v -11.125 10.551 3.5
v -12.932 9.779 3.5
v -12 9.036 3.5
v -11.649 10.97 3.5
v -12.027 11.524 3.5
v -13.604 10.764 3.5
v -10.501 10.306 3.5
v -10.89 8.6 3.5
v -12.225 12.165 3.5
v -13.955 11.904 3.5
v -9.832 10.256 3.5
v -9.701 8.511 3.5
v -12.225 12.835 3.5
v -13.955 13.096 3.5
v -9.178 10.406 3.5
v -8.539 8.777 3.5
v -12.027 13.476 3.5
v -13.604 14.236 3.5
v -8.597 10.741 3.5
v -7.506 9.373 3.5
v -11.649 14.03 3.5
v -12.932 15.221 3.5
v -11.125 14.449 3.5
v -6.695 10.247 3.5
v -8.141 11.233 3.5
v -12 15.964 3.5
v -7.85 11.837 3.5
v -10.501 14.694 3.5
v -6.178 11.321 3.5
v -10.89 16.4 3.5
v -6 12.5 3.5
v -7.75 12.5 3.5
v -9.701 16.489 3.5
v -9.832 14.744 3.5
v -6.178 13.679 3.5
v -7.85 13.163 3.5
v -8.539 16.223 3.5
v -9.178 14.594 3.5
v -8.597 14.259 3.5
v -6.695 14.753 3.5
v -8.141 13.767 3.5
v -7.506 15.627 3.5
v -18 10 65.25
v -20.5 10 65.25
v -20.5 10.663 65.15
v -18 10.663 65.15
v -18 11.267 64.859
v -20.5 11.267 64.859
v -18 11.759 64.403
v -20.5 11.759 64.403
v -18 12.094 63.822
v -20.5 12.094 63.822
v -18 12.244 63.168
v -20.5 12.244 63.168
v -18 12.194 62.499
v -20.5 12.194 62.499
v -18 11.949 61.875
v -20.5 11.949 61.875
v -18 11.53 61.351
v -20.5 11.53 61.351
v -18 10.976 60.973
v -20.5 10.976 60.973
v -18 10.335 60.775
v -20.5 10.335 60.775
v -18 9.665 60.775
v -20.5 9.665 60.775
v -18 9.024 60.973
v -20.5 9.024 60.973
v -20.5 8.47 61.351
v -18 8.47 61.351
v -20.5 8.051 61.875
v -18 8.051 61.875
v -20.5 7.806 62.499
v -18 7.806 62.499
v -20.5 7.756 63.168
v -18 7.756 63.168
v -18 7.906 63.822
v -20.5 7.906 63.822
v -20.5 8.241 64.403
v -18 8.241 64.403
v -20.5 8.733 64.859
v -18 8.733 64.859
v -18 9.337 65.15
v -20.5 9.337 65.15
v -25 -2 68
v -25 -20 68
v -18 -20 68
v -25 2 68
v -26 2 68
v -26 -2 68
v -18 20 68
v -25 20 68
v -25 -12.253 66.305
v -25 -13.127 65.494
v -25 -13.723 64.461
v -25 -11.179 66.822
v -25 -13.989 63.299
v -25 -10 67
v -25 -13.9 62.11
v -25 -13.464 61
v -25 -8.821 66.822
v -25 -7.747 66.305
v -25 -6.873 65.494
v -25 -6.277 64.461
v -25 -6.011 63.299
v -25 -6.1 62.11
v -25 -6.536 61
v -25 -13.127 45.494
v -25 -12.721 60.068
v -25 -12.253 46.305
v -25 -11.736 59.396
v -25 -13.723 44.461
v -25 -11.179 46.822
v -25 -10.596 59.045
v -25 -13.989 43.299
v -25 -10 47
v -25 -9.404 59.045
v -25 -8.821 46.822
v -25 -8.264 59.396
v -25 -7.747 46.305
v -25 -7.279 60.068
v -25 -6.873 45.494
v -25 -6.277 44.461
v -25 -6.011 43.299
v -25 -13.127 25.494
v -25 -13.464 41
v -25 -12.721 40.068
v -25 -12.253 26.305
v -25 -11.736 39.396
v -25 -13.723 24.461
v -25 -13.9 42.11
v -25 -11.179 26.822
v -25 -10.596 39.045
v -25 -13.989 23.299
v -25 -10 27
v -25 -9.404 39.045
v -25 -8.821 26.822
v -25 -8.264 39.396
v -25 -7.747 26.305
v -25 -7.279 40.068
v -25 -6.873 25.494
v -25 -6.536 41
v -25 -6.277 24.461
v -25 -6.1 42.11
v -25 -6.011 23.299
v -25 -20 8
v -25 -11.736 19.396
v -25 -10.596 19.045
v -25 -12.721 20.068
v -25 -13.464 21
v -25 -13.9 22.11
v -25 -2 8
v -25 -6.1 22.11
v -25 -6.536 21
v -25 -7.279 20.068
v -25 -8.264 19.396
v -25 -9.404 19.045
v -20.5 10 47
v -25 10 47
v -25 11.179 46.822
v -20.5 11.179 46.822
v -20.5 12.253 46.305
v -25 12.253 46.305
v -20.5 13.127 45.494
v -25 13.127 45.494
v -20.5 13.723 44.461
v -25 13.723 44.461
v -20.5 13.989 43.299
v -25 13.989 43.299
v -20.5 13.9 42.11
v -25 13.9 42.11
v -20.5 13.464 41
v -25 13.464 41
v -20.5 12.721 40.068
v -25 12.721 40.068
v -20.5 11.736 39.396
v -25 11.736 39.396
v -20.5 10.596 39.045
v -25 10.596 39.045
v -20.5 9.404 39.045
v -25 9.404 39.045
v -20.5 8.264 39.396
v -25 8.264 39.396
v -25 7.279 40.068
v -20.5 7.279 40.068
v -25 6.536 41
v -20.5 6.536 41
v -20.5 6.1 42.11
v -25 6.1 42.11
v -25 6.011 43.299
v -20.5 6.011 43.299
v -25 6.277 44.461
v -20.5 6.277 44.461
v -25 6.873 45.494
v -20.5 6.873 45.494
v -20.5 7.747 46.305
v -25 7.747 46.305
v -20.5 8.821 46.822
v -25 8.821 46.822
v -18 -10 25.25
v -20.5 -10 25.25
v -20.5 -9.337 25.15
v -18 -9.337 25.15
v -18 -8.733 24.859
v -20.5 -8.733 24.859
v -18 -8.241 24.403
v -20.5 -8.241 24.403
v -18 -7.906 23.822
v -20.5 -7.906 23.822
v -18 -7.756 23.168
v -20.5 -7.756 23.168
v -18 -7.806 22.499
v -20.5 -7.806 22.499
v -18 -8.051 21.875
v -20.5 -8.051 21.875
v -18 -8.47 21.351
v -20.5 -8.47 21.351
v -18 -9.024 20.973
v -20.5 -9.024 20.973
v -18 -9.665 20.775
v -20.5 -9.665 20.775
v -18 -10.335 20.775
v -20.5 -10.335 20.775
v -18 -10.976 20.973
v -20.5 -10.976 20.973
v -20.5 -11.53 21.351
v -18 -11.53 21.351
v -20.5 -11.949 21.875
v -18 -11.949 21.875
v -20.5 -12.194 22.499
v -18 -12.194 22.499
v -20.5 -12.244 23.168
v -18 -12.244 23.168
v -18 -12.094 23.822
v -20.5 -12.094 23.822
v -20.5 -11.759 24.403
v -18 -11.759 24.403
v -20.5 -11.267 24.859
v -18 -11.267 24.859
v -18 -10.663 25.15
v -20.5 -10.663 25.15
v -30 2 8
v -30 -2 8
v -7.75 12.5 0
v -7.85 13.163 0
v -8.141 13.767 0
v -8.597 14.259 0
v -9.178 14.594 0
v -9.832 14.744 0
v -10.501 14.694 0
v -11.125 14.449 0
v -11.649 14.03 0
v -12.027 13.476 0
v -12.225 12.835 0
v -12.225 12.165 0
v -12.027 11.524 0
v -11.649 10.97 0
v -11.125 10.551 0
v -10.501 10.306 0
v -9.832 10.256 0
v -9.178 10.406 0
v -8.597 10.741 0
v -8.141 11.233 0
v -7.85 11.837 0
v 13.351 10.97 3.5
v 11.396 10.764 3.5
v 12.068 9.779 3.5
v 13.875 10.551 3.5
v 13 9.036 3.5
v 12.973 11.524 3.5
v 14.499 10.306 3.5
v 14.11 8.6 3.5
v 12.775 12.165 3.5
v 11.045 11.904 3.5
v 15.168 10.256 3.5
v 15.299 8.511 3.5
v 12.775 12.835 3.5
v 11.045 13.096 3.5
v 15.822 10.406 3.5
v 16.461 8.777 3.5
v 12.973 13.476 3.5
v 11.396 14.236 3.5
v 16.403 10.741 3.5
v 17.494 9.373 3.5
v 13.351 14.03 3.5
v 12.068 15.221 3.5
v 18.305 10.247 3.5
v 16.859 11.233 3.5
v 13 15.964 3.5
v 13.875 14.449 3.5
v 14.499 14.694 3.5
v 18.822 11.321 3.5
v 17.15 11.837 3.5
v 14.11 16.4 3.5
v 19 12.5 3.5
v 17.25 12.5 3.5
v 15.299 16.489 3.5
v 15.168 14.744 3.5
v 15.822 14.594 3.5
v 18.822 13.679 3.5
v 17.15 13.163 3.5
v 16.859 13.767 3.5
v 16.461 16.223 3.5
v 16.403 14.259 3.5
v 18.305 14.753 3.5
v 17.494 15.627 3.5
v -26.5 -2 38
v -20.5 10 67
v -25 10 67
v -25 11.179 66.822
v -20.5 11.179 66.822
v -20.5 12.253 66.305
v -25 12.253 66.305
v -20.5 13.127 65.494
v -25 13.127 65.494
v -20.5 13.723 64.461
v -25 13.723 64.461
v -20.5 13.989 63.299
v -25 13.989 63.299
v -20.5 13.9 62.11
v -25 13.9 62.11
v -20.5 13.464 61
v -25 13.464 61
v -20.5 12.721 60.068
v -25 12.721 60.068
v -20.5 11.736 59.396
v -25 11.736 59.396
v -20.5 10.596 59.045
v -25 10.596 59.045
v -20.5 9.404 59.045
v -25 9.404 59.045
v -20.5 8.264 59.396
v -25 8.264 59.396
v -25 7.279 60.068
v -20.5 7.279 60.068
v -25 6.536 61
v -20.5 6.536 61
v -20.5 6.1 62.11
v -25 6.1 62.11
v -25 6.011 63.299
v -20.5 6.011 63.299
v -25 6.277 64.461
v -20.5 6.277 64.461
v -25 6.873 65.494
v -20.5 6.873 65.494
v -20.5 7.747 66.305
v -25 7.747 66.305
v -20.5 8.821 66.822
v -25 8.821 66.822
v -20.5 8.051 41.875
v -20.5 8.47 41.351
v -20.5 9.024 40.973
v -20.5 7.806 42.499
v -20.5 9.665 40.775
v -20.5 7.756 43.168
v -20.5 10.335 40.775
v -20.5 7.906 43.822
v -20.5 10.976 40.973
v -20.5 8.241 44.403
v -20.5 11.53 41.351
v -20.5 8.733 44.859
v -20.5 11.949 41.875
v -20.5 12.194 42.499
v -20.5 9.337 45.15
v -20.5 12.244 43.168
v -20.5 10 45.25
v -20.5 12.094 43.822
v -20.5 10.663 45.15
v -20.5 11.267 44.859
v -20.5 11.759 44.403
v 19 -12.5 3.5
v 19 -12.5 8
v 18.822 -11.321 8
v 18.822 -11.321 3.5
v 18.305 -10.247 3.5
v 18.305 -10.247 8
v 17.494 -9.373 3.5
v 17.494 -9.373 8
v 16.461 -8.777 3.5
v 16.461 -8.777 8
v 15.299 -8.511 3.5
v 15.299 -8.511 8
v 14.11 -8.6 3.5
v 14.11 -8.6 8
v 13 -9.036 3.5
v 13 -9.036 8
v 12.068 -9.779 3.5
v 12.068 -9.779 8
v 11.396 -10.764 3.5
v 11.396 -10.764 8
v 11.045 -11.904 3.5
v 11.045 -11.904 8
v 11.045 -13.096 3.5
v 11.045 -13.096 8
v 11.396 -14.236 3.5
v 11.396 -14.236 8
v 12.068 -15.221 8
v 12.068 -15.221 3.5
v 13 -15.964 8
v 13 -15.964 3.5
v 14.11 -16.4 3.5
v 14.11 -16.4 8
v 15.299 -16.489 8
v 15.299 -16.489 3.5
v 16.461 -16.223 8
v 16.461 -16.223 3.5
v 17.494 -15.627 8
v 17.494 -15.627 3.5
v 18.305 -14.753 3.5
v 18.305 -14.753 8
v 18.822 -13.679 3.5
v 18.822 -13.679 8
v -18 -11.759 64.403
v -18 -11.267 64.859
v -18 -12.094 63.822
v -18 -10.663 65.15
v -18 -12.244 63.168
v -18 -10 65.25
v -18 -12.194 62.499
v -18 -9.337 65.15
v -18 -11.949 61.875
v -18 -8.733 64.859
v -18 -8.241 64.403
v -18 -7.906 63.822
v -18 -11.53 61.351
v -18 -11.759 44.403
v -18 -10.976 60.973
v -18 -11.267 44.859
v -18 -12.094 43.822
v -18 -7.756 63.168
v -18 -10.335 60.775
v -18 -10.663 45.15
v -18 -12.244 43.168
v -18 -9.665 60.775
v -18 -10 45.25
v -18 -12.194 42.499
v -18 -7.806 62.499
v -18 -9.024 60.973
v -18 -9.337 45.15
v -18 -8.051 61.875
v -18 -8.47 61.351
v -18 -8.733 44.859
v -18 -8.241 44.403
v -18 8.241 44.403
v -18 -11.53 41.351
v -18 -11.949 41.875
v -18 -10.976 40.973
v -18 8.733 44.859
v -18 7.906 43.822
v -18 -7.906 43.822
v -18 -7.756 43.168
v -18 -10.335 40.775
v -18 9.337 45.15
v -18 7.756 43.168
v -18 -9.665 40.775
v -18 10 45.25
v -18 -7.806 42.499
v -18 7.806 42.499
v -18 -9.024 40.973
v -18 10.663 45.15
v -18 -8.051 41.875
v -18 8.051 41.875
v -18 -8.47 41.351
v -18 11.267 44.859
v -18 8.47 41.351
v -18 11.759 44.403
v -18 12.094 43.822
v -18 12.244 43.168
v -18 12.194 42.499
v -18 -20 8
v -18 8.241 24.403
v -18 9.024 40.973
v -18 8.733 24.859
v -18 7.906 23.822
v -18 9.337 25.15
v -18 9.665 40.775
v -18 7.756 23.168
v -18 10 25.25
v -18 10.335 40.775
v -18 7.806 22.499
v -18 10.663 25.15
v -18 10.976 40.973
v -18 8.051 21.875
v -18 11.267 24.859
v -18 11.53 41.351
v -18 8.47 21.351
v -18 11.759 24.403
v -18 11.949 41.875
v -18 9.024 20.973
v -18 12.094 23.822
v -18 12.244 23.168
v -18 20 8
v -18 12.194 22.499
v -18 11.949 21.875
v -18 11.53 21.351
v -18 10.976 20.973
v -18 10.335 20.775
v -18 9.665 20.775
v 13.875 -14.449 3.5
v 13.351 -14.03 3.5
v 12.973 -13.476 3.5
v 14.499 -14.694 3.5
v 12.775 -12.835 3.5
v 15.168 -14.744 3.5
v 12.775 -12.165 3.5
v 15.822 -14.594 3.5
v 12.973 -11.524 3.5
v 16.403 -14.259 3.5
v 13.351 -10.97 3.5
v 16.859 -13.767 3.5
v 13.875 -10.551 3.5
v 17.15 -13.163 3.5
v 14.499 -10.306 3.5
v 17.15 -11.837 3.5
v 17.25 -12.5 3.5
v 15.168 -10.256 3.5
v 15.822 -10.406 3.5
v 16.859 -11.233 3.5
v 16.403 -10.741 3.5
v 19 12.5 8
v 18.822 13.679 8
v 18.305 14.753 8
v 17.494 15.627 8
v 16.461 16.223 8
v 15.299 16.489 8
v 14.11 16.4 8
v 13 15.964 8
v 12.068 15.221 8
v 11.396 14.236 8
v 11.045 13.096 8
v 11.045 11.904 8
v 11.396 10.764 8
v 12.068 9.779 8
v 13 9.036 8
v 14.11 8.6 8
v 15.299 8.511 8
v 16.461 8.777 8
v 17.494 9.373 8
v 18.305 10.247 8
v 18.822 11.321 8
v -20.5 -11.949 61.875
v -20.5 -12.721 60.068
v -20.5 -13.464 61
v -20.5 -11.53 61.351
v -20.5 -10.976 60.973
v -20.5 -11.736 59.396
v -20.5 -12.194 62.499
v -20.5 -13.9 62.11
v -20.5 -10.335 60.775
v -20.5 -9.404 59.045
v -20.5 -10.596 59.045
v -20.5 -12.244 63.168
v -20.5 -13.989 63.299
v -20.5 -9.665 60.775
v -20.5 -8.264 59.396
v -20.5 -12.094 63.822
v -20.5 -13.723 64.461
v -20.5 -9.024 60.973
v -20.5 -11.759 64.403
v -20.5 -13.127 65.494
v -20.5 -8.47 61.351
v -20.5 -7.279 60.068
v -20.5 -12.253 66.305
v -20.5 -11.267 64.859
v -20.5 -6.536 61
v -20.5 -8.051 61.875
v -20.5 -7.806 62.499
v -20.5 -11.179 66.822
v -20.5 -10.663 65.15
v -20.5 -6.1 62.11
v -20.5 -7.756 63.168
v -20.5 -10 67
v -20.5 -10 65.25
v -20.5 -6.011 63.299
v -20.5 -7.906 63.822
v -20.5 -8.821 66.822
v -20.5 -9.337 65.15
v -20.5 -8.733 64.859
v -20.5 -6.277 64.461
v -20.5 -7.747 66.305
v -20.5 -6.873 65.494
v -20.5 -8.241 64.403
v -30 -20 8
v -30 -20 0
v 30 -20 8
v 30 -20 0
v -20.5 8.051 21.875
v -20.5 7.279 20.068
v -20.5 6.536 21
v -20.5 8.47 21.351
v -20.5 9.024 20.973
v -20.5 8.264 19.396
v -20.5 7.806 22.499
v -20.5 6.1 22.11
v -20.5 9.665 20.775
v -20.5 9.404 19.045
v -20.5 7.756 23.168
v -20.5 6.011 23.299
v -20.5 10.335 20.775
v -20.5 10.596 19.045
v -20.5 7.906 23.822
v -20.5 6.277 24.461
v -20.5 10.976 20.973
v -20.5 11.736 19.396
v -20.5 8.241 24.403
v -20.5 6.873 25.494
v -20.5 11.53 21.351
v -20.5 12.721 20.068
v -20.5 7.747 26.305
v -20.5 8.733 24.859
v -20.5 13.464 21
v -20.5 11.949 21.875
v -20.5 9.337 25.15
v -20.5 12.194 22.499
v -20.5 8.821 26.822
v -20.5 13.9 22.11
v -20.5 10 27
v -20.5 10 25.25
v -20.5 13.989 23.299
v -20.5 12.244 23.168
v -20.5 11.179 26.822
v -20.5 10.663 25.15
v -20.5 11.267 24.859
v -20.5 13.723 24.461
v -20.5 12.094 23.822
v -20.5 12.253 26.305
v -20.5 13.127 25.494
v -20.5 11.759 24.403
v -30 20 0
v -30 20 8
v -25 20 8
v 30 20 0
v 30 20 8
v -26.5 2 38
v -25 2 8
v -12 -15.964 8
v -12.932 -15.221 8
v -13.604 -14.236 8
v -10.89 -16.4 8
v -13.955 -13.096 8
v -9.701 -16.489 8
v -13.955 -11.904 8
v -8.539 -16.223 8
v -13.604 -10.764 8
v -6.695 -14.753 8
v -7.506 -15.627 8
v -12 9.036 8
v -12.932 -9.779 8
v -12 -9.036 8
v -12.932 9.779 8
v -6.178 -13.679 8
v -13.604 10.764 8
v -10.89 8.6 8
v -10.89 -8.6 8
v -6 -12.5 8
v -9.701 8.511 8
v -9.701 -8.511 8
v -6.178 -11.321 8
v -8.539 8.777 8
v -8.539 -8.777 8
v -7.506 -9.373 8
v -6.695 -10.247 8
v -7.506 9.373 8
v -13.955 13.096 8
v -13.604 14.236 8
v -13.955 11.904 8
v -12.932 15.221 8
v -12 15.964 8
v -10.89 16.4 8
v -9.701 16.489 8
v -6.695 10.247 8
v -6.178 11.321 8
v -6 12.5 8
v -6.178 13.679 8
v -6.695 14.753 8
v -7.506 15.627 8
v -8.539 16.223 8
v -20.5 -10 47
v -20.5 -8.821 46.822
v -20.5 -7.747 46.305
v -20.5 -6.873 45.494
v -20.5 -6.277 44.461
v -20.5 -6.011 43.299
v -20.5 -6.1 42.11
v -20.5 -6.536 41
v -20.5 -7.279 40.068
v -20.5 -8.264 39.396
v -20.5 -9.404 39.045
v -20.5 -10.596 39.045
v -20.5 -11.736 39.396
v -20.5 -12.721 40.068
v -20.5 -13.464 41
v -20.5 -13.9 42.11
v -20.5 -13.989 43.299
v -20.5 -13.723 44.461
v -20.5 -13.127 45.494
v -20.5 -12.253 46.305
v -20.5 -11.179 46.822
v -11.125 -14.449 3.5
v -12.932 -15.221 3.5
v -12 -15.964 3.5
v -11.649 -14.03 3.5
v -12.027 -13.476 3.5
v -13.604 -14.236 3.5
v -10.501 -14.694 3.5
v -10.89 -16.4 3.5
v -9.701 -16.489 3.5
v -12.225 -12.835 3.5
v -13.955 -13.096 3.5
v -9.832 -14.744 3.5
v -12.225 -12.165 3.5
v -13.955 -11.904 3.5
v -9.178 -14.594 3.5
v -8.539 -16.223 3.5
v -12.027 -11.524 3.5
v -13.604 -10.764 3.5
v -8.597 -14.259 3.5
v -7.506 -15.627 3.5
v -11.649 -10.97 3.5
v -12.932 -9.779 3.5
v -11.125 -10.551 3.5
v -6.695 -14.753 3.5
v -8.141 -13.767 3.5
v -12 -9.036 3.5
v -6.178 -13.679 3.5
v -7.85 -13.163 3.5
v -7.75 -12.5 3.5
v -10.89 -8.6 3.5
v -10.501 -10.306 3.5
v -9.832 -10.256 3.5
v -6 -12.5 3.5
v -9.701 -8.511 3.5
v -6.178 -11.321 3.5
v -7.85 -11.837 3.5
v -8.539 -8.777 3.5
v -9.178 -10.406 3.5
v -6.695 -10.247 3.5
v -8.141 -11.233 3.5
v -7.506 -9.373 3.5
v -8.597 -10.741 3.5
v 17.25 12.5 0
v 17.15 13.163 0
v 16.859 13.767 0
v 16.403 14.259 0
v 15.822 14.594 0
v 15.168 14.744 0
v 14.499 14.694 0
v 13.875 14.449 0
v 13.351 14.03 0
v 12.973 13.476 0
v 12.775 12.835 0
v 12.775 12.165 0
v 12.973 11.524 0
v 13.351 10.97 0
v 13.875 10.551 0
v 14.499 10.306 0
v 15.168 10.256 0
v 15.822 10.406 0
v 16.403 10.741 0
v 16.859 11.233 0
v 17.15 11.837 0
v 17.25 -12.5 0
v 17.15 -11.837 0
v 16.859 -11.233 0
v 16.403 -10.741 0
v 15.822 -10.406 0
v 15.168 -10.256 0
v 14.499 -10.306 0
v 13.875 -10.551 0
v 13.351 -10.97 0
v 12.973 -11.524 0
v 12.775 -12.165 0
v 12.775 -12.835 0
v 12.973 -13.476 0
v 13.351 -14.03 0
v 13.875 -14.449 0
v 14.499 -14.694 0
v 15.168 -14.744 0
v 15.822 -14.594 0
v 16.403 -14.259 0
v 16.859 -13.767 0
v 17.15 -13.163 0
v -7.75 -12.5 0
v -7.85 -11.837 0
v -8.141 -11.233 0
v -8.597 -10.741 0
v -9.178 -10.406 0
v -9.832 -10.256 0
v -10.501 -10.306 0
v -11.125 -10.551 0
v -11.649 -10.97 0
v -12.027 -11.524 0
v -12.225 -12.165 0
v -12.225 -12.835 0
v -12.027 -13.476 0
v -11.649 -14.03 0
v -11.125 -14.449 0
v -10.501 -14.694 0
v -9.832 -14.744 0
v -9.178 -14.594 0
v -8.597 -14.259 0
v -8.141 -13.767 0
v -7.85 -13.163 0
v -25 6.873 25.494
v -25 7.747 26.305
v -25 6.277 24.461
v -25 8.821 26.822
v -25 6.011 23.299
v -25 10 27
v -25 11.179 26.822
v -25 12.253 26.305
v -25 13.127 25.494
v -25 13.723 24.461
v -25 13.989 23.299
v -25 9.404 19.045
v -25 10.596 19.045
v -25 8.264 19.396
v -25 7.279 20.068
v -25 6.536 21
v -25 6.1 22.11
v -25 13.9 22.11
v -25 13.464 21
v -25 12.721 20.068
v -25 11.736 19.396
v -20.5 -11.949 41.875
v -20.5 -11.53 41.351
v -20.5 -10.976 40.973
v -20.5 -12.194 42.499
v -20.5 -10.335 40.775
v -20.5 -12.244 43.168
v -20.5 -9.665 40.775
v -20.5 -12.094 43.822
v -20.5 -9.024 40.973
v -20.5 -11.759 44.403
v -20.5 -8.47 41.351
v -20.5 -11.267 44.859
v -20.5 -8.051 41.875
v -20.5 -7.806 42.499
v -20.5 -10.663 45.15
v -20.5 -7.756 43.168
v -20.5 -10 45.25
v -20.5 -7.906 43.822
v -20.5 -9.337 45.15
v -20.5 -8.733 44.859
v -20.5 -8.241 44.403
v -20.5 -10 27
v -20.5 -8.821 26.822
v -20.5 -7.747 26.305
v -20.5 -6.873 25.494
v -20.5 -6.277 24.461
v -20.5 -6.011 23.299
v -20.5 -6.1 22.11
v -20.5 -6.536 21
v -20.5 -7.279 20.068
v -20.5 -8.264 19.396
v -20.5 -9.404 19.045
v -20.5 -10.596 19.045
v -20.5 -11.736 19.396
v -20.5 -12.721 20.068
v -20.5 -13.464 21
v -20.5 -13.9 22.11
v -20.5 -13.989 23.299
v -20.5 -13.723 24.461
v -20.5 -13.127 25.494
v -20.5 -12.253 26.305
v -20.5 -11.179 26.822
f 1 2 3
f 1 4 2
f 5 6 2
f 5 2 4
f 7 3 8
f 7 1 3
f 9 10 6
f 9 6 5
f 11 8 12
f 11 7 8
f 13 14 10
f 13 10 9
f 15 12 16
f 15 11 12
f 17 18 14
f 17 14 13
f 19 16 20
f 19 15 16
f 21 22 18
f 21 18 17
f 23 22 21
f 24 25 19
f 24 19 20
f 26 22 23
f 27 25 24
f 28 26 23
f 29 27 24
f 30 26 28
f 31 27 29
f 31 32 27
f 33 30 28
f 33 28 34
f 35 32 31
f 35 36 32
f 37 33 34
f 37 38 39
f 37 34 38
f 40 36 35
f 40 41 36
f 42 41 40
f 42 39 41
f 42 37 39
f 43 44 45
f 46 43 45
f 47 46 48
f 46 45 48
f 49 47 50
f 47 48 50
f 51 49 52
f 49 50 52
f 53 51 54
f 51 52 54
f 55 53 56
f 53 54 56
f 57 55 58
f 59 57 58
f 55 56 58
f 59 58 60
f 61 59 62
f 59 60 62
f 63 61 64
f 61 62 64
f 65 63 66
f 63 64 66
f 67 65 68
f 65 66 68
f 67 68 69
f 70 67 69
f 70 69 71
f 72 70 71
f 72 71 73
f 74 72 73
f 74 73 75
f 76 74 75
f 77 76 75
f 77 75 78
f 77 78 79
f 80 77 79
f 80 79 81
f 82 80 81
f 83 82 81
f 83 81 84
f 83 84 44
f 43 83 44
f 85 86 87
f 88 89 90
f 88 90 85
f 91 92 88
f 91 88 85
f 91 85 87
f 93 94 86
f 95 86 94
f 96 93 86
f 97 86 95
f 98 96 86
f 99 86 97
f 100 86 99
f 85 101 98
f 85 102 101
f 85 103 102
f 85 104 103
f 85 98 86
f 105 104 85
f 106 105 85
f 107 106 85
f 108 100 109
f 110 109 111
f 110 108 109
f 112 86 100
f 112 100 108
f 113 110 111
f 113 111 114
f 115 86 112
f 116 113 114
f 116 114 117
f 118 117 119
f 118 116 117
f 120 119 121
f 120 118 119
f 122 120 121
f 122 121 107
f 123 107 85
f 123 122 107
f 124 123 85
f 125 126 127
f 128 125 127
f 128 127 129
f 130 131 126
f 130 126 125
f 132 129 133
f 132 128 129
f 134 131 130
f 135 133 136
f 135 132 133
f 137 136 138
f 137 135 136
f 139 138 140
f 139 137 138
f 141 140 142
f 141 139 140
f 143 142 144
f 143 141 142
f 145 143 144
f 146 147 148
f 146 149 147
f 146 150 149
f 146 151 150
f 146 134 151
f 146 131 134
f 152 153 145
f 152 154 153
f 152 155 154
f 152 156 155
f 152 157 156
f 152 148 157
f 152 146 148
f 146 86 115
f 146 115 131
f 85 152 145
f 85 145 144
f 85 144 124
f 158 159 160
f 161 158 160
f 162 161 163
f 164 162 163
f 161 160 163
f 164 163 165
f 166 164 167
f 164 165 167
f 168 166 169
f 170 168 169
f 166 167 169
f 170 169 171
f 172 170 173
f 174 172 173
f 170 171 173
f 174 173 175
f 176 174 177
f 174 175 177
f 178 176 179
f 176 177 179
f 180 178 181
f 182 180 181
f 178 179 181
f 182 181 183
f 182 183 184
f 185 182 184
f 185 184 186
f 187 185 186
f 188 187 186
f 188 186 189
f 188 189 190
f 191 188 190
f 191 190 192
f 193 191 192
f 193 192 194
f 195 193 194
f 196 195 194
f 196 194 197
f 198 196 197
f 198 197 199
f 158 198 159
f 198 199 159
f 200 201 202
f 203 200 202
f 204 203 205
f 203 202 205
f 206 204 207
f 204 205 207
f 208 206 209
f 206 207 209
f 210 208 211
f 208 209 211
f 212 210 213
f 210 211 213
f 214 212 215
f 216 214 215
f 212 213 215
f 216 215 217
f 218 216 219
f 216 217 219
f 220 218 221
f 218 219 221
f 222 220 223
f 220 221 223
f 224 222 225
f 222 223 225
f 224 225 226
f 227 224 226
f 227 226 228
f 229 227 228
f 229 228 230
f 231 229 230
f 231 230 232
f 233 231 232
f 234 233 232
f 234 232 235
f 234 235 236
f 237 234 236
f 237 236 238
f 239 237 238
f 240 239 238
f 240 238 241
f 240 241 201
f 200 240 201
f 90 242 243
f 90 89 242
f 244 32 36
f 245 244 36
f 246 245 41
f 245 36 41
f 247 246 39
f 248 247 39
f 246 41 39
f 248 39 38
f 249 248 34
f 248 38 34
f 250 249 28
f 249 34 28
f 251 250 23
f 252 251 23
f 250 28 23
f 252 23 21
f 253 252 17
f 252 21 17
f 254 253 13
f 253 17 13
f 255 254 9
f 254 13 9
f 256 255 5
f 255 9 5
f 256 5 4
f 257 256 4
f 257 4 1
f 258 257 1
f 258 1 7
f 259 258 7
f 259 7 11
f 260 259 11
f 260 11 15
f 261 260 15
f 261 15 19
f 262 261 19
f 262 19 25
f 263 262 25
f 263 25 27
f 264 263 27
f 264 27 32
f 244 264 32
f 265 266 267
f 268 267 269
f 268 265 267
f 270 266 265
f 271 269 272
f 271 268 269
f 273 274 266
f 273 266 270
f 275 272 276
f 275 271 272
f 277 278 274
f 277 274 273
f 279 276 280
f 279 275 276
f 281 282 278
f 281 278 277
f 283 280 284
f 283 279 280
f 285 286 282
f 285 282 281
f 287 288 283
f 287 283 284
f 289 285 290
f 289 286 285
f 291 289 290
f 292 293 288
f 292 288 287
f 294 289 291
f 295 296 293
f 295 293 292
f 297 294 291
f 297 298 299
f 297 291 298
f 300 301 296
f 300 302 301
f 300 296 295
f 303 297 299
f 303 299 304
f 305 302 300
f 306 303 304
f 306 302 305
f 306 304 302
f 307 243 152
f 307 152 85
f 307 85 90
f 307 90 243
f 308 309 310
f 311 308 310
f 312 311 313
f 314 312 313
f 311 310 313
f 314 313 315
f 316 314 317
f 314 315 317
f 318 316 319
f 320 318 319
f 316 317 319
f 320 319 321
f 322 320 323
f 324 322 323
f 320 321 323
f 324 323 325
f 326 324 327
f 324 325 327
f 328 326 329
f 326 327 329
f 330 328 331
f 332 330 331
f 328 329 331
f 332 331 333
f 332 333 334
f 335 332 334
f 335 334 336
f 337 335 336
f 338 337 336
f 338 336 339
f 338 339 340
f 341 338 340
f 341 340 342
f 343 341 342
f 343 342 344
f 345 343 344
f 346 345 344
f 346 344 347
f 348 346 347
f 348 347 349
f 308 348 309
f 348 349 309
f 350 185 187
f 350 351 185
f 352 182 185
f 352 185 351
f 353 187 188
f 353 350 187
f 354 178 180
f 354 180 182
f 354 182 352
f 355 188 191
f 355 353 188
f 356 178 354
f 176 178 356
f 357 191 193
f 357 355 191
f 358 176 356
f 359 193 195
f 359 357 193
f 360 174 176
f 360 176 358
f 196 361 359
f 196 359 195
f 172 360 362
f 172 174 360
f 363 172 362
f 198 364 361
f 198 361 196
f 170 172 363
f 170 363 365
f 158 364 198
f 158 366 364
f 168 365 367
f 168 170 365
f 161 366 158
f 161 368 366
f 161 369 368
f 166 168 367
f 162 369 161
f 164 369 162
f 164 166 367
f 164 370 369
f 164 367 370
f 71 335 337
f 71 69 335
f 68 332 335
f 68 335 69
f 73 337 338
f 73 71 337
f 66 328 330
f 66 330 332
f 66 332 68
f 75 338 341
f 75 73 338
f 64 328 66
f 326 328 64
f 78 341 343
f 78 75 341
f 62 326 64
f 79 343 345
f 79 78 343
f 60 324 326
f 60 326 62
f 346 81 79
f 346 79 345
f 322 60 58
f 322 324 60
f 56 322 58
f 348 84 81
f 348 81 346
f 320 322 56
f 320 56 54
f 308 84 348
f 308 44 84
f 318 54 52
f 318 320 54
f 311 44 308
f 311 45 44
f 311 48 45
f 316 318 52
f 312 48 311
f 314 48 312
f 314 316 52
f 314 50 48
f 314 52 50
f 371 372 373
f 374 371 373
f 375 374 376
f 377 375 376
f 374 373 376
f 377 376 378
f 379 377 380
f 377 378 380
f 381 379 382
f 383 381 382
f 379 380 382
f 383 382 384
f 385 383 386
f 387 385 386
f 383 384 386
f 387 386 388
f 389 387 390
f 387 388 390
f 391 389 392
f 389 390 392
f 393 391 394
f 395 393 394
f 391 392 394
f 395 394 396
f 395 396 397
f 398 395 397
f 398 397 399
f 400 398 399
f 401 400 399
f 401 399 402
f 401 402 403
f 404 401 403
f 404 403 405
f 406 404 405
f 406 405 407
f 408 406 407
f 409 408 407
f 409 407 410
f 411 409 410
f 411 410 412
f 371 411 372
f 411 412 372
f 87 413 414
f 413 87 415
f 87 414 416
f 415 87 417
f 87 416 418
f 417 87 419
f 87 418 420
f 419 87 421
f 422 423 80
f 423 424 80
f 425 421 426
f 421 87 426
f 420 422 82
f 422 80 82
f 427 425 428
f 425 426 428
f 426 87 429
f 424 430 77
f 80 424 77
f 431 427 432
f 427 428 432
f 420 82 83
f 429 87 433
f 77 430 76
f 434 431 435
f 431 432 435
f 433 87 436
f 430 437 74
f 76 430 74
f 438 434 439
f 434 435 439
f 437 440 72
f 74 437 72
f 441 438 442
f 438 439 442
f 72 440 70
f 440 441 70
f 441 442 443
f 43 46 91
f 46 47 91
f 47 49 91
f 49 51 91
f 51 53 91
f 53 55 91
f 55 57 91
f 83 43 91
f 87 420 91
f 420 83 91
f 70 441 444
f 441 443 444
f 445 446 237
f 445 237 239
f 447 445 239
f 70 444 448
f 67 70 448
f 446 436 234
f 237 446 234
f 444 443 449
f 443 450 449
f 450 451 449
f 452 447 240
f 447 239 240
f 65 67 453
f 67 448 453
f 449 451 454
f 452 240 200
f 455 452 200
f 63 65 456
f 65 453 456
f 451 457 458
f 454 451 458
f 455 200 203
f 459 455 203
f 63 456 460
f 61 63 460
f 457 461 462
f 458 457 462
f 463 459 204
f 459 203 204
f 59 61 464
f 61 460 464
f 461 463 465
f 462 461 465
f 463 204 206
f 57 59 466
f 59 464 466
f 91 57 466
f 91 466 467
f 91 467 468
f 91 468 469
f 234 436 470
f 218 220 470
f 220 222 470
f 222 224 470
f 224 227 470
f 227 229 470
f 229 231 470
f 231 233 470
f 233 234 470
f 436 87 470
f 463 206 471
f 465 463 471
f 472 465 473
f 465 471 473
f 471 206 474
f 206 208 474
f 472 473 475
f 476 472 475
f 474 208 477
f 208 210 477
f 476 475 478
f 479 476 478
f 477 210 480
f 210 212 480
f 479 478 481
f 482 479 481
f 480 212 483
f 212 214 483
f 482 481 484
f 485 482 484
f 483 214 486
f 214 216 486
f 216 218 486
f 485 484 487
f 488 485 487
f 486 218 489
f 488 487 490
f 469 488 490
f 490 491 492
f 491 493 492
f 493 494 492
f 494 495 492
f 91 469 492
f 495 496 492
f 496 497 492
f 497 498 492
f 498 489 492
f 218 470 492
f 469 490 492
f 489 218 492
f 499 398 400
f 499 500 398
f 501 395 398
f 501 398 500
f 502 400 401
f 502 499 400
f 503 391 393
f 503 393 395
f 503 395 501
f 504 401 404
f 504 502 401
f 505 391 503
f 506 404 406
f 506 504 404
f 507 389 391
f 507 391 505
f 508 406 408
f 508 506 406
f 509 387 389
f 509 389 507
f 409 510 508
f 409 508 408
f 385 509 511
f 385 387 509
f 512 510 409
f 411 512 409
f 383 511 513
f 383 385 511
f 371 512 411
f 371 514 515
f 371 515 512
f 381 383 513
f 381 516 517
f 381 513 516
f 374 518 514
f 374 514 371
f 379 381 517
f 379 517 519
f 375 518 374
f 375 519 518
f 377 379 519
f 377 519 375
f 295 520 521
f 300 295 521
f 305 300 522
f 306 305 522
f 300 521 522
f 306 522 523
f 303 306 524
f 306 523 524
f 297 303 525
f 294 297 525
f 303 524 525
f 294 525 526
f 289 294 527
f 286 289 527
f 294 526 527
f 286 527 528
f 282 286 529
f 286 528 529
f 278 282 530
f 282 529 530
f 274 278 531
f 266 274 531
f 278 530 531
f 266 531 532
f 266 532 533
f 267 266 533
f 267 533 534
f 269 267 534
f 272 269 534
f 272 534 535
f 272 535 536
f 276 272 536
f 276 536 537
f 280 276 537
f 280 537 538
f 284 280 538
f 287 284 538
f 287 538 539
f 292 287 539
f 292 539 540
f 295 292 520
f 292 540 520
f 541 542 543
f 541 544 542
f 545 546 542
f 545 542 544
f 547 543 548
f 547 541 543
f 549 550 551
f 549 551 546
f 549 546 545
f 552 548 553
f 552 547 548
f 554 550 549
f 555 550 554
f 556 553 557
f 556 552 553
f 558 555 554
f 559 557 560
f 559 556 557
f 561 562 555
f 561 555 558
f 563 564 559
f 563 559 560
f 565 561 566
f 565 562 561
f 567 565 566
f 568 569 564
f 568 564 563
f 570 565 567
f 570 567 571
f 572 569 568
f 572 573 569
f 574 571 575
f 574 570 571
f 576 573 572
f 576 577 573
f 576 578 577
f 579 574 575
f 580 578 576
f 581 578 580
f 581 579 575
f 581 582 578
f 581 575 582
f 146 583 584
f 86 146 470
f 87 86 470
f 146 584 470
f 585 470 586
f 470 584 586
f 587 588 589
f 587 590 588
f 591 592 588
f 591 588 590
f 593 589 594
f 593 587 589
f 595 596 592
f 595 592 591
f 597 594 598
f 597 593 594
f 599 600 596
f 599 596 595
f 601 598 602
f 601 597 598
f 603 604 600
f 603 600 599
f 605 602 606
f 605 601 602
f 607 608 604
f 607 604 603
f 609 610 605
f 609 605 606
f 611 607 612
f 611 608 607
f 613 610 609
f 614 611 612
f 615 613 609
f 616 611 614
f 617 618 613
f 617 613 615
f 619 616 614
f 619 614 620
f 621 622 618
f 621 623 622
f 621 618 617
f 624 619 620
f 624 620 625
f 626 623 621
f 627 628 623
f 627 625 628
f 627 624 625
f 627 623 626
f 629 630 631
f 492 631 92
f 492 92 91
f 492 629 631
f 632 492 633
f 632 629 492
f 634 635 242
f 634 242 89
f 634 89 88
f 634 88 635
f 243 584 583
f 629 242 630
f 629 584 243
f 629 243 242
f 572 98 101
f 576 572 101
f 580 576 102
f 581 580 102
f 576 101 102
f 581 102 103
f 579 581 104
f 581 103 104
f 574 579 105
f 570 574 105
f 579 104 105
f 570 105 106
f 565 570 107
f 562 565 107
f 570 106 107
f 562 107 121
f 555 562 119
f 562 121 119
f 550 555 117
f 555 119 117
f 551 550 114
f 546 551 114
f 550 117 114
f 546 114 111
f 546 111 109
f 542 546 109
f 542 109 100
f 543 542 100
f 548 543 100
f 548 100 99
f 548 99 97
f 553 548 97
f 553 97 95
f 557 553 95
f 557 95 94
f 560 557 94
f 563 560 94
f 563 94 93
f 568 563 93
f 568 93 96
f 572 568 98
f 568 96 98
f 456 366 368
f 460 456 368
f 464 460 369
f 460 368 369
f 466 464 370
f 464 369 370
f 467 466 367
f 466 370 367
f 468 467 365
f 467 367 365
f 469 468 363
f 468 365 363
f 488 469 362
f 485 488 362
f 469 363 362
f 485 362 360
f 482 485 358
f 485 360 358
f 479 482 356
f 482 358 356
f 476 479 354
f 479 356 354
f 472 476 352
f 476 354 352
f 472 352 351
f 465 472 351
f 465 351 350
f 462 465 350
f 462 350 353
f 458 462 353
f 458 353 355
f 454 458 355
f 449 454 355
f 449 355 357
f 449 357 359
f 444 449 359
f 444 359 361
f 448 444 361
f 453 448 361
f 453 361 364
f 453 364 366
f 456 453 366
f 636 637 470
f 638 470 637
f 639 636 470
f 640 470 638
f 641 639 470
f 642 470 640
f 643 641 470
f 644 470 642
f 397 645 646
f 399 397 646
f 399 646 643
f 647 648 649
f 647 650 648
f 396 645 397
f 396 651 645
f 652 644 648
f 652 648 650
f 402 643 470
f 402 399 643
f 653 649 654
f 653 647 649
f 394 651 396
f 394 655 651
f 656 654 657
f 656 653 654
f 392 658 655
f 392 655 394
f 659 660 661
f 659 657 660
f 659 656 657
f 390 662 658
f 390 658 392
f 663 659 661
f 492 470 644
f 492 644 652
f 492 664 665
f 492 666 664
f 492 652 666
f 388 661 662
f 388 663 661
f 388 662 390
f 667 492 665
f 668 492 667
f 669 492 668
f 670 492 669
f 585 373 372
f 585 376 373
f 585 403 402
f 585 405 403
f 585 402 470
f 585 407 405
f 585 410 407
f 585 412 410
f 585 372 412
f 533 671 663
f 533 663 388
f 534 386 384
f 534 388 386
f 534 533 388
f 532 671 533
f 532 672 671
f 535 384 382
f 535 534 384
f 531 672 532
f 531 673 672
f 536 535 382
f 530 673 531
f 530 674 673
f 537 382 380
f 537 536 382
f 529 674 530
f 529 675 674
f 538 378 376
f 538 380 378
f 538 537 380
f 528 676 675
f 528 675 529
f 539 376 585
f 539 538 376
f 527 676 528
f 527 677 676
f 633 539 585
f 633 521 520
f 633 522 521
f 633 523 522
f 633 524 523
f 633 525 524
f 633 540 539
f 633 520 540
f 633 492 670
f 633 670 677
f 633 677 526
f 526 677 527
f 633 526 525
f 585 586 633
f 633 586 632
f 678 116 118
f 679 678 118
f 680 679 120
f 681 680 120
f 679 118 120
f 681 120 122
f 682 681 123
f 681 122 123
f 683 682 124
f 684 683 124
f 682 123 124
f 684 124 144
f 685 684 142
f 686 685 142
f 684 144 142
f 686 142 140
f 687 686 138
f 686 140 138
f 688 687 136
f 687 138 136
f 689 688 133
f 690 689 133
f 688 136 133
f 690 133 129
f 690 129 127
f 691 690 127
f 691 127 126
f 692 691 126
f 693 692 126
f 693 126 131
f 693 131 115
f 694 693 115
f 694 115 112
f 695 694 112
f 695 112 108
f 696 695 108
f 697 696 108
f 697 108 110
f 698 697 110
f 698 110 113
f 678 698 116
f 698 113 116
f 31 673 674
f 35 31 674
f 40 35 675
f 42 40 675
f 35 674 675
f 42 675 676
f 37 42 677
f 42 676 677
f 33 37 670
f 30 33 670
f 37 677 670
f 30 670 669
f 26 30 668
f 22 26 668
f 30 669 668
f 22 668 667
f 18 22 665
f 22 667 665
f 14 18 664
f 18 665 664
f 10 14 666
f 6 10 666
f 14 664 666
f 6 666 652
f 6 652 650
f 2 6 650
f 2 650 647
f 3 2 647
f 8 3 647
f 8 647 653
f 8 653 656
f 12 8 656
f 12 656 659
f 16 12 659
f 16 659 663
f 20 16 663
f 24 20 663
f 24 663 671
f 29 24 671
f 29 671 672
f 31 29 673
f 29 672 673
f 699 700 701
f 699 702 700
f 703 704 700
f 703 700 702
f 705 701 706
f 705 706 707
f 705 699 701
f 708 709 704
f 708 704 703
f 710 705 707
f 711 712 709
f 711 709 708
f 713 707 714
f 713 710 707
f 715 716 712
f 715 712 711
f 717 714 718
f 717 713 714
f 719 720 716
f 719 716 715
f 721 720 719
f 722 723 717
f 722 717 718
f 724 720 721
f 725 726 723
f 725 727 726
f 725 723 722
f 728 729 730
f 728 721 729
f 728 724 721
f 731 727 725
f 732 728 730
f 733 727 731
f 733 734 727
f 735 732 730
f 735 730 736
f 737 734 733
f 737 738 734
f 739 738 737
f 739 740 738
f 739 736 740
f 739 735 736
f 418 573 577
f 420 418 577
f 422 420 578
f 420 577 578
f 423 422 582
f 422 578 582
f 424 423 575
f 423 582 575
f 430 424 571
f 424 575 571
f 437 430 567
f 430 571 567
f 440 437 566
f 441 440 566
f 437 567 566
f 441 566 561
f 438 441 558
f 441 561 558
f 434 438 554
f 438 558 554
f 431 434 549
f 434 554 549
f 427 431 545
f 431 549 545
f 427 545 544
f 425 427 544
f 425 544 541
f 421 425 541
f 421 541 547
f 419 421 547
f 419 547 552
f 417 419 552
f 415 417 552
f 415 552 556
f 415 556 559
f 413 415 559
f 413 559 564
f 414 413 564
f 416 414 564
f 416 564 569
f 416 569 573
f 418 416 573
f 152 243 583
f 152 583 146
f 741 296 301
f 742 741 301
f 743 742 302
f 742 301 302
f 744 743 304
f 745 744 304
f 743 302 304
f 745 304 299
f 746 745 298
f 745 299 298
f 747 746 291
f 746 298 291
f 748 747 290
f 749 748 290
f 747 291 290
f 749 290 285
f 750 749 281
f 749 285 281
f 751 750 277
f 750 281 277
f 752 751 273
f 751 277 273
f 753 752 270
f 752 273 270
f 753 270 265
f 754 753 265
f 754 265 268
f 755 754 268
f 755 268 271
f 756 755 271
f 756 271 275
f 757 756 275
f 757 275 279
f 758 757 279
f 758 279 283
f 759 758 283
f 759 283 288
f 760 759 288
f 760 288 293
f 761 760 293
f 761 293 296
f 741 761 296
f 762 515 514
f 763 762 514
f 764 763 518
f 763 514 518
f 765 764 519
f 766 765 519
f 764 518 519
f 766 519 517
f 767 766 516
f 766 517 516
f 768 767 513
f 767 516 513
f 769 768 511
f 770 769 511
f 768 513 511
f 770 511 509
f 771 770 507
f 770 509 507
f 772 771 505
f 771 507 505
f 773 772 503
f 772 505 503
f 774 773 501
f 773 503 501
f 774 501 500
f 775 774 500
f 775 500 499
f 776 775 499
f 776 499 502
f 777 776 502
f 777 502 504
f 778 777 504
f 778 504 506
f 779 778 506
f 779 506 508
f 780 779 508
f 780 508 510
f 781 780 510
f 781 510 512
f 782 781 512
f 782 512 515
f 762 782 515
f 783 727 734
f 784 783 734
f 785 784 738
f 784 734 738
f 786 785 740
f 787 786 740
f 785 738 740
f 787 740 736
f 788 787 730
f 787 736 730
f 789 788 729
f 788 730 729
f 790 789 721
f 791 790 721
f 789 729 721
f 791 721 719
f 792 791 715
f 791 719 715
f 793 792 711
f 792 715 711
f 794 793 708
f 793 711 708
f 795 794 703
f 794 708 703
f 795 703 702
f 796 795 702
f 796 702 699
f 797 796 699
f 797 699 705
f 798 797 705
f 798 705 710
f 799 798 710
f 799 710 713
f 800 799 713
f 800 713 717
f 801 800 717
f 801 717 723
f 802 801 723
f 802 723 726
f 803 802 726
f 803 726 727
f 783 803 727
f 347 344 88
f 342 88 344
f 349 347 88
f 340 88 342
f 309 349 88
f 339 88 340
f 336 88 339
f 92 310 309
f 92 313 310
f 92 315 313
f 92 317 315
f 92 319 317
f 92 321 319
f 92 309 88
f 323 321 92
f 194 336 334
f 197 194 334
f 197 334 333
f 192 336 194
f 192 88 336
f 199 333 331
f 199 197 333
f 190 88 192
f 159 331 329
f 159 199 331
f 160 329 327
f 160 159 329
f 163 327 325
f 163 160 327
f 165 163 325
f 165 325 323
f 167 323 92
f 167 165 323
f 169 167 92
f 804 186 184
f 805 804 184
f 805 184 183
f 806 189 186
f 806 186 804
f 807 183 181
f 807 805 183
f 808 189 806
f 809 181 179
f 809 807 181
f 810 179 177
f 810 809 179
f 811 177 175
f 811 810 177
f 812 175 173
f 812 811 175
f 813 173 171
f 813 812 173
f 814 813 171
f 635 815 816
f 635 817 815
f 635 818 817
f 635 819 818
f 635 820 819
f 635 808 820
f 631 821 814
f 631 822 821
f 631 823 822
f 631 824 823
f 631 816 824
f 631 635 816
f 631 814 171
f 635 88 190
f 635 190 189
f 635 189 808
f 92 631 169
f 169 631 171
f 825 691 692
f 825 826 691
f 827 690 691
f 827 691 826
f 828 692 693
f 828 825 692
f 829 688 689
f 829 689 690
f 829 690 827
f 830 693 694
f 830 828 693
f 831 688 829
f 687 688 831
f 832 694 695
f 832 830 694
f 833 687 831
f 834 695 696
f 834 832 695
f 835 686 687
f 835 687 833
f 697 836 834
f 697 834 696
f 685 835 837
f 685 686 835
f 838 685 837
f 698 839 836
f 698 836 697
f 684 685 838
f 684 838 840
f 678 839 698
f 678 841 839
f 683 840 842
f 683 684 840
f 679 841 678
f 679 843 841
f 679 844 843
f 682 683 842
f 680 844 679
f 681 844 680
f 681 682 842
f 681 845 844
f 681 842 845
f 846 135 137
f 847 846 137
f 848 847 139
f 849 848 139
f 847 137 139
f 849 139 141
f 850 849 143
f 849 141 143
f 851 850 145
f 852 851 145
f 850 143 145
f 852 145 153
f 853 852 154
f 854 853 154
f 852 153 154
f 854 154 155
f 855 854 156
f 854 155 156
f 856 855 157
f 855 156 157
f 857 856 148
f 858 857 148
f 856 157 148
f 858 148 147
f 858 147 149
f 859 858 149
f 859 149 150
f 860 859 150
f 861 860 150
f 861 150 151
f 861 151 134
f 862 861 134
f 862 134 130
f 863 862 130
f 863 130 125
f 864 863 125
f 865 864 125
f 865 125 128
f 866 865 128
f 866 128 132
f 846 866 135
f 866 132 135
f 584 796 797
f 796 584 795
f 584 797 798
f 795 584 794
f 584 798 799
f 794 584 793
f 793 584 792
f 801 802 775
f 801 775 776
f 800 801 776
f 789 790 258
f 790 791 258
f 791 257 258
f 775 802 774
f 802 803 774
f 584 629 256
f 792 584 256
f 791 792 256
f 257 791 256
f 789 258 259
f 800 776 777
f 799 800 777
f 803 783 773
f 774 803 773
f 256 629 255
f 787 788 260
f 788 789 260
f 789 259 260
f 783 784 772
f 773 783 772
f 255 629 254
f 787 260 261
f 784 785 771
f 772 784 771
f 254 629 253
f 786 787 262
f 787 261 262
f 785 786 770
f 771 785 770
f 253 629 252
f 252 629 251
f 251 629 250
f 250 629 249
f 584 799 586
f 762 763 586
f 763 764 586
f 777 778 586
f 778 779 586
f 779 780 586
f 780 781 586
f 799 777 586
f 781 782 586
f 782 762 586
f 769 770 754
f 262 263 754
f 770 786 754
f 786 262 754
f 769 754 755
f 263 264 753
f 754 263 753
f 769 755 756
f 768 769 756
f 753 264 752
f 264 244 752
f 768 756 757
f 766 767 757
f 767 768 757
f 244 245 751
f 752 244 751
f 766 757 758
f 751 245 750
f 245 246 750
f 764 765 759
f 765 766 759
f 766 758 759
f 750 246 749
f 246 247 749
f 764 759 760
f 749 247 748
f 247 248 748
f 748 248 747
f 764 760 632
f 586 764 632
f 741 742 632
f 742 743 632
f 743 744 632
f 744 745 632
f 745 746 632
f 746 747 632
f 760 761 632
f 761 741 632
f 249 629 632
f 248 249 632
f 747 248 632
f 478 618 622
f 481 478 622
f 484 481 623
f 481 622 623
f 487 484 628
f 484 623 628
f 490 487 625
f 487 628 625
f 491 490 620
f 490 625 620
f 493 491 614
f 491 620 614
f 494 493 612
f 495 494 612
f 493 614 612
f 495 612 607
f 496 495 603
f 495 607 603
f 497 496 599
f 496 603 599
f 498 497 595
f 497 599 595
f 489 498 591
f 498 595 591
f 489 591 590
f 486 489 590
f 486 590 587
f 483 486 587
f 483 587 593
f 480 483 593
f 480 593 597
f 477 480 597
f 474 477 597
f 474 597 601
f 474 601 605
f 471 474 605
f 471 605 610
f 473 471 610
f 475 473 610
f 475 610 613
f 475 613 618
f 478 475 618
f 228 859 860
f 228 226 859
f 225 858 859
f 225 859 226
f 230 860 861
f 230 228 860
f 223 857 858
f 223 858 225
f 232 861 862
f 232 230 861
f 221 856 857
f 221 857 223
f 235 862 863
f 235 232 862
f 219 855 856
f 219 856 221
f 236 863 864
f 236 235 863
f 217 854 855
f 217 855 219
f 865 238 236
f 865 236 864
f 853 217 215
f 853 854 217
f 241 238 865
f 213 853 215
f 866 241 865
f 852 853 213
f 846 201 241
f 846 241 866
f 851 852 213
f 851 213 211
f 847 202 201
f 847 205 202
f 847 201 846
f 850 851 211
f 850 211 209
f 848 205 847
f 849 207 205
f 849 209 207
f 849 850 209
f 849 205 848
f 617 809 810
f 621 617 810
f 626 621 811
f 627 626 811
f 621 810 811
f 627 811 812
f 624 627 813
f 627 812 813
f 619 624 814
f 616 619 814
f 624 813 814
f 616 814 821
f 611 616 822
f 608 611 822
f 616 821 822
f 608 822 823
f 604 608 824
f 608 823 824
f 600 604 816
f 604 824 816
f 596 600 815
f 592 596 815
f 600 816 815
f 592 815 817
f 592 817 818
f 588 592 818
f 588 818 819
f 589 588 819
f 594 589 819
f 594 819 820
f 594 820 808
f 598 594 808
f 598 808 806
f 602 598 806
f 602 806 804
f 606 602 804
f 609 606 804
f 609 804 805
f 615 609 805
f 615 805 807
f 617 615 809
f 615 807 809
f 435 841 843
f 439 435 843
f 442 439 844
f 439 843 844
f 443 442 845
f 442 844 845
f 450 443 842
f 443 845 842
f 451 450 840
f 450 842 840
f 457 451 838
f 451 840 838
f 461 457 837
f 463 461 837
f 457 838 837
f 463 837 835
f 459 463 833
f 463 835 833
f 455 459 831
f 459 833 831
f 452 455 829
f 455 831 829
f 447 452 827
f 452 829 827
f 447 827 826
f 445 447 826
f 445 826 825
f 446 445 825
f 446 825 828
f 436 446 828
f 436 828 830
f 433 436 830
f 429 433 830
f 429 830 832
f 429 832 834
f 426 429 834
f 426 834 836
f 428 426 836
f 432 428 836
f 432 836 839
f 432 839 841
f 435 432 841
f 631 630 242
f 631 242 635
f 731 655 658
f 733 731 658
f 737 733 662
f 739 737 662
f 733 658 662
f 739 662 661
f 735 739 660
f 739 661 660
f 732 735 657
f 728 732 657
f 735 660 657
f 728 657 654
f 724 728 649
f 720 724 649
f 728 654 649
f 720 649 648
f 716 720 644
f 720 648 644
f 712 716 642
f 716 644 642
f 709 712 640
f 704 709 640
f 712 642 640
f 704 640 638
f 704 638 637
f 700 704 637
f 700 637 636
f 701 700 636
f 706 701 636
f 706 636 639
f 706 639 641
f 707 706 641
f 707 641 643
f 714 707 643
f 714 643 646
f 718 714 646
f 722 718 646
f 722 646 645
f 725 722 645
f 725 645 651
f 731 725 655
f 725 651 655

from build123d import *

# Parameters (mm, degrees)
SKETCH_1_W             = 60
SKETCH_1_H             = 40
EXTRUDE_2_DEPTH        = 8
SKETCH_3_R             = 2.25
CUT_EXTRUDE_1_DEPTH    = 8
SKETCH_4_R             = 4
CUT_EXTRUDE_2_DEPTH    = 4.5
SKETCH_5_W             = 7
SKETCH_5_H             = 40
EXTRUDE_3_DEPTH        = 60
CUT_EXTRUDE_3_REACH    = 91.716
SKETCH_6_R             = 2.25
SKETCH_7_R             = 4
CUT_EXTRUDE_4_DEPTH    = 4.5
PATTERN_LINEAR_1_COUNT = 3
PATTERN_LINEAR_1_PITCH = 20


with BuildPart() as part:
    # 草图1 → 凸台-拉伸2 (new body)
    with BuildSketch(Plane.XY):
        Rectangle(SKETCH_1_W, SKETCH_1_H)
    extrude(amount=EXTRUDE_2_DEPTH)

    # 草图3 → 切除-拉伸1 (cut)
    with BuildSketch(Plane.XY.offset(8)):
        with Locations((15, 12.5)):
            Circle(SKETCH_3_R)
        with Locations((15, -12.5)):
            Circle(SKETCH_3_R)
        with Locations((-10, 12.5)):
            Circle(SKETCH_3_R)
        with Locations((-10, -12.5)):
            Circle(SKETCH_3_R)
    extrude(amount=-CUT_EXTRUDE_1_DEPTH, mode=Mode.SUBTRACT)

    # 草图4 → 切除-拉伸2 (cut)
    with BuildSketch(Plane.XY.offset(8)):
        with Locations((15, 12.5)):
            Circle(SKETCH_4_R)
        with Locations((15, -12.5)):
            Circle(SKETCH_4_R)
        with Locations((-10, 12.5)):
            Circle(SKETCH_4_R)
        with Locations((-10, -12.5)):
            Circle(SKETCH_4_R)
    extrude(amount=-CUT_EXTRUDE_2_DEPTH, mode=Mode.SUBTRACT)

    # 草图5 → 凸台-拉伸3 (add)
    with BuildSketch(Plane.XY.offset(8)):
        with Locations((-21.5, 0)):
            Rectangle(SKETCH_5_W, SKETCH_5_H)
    extrude(amount=EXTRUDE_3_DEPTH)

    # 草图6 → 切除-拉伸3 (cut, up to next)
    with BuildSketch(Plane.ZY.offset(25), mode=Mode.PRIVATE) as cut_extrude_3_sk1:
        with Locations((63, 10)):
            Circle(SKETCH_6_R)
    cut_extrude_3_tool1 = extrude(cut_extrude_3_sk1.sketch, amount=-CUT_EXTRUDE_3_REACH, mode=Mode.PRIVATE) & part.part
    # 草图6 → 切除-拉伸3 (cut, up to next)
    with BuildSketch(Plane.ZY.offset(25), mode=Mode.PRIVATE) as cut_extrude_3_sk2:
        with Locations((63, -10)):
            Circle(SKETCH_6_R)
    cut_extrude_3_tool2 = extrude(cut_extrude_3_sk2.sketch, amount=-CUT_EXTRUDE_3_REACH, mode=Mode.PRIVATE) & part.part
    cut_extrude_3_1 = cut_extrude_3_tool1.solids().sort_by_distance((-25, 10, 63))[0]
    add(cut_extrude_3_1, mode=Mode.SUBTRACT)
    cut_extrude_3_2 = cut_extrude_3_tool2.solids().sort_by_distance((-25, -10, 63))[0]
    add(cut_extrude_3_2, mode=Mode.SUBTRACT)
    cut_extrude_3 = cut_extrude_3_1 + cut_extrude_3_2  # 切除-拉伸3 as one shape, for the pattern or mirror that repeats it

    # 草图7 → 切除-拉伸4 (cut)
    with BuildSketch(Plane.ZY.offset(25)):
        with Locations((63, 10)):
            Circle(SKETCH_7_R)
        with Locations((63, -10)):
            Circle(SKETCH_7_R)
    cut_extrude_4 = extrude(amount=-CUT_EXTRUDE_4_DEPTH, mode=Mode.SUBTRACT)

    # 阵列(线性)1: 切除-拉伸3, 切除-拉伸4 ×3
    with Locations(*[(0, 0, -i * PATTERN_LINEAR_1_PITCH) for i in range(1, PATTERN_LINEAR_1_COUNT)]):
        add(cut_extrude_3, mode=Mode.SUBTRACT)
        add(cut_extrude_4, mode=Mode.SUBTRACT)

    # 草图8 → 放样2 section 0
    with BuildSketch(Plane.XY.offset(8)):
        with BuildLine():
            Line((-30, 2), (-30, -2))
            Line((-30, -2), (-25, -2))
            Line((-25, -2), (-25, 2))
            Line((-25, 2), (-30, 2))
        make_face()
    # 草图9 → 放样2 section 1
    with BuildSketch(Plane.XY.offset(68)):
        with BuildLine():
            Line((-25, 2), (-26, 2))
            Line((-26, 2), (-26, -2))
            Line((-26, -2), (-25, -2))
            Line((-25, -2), (-25, 2))
        make_face()
    loft()


solid = part.part
